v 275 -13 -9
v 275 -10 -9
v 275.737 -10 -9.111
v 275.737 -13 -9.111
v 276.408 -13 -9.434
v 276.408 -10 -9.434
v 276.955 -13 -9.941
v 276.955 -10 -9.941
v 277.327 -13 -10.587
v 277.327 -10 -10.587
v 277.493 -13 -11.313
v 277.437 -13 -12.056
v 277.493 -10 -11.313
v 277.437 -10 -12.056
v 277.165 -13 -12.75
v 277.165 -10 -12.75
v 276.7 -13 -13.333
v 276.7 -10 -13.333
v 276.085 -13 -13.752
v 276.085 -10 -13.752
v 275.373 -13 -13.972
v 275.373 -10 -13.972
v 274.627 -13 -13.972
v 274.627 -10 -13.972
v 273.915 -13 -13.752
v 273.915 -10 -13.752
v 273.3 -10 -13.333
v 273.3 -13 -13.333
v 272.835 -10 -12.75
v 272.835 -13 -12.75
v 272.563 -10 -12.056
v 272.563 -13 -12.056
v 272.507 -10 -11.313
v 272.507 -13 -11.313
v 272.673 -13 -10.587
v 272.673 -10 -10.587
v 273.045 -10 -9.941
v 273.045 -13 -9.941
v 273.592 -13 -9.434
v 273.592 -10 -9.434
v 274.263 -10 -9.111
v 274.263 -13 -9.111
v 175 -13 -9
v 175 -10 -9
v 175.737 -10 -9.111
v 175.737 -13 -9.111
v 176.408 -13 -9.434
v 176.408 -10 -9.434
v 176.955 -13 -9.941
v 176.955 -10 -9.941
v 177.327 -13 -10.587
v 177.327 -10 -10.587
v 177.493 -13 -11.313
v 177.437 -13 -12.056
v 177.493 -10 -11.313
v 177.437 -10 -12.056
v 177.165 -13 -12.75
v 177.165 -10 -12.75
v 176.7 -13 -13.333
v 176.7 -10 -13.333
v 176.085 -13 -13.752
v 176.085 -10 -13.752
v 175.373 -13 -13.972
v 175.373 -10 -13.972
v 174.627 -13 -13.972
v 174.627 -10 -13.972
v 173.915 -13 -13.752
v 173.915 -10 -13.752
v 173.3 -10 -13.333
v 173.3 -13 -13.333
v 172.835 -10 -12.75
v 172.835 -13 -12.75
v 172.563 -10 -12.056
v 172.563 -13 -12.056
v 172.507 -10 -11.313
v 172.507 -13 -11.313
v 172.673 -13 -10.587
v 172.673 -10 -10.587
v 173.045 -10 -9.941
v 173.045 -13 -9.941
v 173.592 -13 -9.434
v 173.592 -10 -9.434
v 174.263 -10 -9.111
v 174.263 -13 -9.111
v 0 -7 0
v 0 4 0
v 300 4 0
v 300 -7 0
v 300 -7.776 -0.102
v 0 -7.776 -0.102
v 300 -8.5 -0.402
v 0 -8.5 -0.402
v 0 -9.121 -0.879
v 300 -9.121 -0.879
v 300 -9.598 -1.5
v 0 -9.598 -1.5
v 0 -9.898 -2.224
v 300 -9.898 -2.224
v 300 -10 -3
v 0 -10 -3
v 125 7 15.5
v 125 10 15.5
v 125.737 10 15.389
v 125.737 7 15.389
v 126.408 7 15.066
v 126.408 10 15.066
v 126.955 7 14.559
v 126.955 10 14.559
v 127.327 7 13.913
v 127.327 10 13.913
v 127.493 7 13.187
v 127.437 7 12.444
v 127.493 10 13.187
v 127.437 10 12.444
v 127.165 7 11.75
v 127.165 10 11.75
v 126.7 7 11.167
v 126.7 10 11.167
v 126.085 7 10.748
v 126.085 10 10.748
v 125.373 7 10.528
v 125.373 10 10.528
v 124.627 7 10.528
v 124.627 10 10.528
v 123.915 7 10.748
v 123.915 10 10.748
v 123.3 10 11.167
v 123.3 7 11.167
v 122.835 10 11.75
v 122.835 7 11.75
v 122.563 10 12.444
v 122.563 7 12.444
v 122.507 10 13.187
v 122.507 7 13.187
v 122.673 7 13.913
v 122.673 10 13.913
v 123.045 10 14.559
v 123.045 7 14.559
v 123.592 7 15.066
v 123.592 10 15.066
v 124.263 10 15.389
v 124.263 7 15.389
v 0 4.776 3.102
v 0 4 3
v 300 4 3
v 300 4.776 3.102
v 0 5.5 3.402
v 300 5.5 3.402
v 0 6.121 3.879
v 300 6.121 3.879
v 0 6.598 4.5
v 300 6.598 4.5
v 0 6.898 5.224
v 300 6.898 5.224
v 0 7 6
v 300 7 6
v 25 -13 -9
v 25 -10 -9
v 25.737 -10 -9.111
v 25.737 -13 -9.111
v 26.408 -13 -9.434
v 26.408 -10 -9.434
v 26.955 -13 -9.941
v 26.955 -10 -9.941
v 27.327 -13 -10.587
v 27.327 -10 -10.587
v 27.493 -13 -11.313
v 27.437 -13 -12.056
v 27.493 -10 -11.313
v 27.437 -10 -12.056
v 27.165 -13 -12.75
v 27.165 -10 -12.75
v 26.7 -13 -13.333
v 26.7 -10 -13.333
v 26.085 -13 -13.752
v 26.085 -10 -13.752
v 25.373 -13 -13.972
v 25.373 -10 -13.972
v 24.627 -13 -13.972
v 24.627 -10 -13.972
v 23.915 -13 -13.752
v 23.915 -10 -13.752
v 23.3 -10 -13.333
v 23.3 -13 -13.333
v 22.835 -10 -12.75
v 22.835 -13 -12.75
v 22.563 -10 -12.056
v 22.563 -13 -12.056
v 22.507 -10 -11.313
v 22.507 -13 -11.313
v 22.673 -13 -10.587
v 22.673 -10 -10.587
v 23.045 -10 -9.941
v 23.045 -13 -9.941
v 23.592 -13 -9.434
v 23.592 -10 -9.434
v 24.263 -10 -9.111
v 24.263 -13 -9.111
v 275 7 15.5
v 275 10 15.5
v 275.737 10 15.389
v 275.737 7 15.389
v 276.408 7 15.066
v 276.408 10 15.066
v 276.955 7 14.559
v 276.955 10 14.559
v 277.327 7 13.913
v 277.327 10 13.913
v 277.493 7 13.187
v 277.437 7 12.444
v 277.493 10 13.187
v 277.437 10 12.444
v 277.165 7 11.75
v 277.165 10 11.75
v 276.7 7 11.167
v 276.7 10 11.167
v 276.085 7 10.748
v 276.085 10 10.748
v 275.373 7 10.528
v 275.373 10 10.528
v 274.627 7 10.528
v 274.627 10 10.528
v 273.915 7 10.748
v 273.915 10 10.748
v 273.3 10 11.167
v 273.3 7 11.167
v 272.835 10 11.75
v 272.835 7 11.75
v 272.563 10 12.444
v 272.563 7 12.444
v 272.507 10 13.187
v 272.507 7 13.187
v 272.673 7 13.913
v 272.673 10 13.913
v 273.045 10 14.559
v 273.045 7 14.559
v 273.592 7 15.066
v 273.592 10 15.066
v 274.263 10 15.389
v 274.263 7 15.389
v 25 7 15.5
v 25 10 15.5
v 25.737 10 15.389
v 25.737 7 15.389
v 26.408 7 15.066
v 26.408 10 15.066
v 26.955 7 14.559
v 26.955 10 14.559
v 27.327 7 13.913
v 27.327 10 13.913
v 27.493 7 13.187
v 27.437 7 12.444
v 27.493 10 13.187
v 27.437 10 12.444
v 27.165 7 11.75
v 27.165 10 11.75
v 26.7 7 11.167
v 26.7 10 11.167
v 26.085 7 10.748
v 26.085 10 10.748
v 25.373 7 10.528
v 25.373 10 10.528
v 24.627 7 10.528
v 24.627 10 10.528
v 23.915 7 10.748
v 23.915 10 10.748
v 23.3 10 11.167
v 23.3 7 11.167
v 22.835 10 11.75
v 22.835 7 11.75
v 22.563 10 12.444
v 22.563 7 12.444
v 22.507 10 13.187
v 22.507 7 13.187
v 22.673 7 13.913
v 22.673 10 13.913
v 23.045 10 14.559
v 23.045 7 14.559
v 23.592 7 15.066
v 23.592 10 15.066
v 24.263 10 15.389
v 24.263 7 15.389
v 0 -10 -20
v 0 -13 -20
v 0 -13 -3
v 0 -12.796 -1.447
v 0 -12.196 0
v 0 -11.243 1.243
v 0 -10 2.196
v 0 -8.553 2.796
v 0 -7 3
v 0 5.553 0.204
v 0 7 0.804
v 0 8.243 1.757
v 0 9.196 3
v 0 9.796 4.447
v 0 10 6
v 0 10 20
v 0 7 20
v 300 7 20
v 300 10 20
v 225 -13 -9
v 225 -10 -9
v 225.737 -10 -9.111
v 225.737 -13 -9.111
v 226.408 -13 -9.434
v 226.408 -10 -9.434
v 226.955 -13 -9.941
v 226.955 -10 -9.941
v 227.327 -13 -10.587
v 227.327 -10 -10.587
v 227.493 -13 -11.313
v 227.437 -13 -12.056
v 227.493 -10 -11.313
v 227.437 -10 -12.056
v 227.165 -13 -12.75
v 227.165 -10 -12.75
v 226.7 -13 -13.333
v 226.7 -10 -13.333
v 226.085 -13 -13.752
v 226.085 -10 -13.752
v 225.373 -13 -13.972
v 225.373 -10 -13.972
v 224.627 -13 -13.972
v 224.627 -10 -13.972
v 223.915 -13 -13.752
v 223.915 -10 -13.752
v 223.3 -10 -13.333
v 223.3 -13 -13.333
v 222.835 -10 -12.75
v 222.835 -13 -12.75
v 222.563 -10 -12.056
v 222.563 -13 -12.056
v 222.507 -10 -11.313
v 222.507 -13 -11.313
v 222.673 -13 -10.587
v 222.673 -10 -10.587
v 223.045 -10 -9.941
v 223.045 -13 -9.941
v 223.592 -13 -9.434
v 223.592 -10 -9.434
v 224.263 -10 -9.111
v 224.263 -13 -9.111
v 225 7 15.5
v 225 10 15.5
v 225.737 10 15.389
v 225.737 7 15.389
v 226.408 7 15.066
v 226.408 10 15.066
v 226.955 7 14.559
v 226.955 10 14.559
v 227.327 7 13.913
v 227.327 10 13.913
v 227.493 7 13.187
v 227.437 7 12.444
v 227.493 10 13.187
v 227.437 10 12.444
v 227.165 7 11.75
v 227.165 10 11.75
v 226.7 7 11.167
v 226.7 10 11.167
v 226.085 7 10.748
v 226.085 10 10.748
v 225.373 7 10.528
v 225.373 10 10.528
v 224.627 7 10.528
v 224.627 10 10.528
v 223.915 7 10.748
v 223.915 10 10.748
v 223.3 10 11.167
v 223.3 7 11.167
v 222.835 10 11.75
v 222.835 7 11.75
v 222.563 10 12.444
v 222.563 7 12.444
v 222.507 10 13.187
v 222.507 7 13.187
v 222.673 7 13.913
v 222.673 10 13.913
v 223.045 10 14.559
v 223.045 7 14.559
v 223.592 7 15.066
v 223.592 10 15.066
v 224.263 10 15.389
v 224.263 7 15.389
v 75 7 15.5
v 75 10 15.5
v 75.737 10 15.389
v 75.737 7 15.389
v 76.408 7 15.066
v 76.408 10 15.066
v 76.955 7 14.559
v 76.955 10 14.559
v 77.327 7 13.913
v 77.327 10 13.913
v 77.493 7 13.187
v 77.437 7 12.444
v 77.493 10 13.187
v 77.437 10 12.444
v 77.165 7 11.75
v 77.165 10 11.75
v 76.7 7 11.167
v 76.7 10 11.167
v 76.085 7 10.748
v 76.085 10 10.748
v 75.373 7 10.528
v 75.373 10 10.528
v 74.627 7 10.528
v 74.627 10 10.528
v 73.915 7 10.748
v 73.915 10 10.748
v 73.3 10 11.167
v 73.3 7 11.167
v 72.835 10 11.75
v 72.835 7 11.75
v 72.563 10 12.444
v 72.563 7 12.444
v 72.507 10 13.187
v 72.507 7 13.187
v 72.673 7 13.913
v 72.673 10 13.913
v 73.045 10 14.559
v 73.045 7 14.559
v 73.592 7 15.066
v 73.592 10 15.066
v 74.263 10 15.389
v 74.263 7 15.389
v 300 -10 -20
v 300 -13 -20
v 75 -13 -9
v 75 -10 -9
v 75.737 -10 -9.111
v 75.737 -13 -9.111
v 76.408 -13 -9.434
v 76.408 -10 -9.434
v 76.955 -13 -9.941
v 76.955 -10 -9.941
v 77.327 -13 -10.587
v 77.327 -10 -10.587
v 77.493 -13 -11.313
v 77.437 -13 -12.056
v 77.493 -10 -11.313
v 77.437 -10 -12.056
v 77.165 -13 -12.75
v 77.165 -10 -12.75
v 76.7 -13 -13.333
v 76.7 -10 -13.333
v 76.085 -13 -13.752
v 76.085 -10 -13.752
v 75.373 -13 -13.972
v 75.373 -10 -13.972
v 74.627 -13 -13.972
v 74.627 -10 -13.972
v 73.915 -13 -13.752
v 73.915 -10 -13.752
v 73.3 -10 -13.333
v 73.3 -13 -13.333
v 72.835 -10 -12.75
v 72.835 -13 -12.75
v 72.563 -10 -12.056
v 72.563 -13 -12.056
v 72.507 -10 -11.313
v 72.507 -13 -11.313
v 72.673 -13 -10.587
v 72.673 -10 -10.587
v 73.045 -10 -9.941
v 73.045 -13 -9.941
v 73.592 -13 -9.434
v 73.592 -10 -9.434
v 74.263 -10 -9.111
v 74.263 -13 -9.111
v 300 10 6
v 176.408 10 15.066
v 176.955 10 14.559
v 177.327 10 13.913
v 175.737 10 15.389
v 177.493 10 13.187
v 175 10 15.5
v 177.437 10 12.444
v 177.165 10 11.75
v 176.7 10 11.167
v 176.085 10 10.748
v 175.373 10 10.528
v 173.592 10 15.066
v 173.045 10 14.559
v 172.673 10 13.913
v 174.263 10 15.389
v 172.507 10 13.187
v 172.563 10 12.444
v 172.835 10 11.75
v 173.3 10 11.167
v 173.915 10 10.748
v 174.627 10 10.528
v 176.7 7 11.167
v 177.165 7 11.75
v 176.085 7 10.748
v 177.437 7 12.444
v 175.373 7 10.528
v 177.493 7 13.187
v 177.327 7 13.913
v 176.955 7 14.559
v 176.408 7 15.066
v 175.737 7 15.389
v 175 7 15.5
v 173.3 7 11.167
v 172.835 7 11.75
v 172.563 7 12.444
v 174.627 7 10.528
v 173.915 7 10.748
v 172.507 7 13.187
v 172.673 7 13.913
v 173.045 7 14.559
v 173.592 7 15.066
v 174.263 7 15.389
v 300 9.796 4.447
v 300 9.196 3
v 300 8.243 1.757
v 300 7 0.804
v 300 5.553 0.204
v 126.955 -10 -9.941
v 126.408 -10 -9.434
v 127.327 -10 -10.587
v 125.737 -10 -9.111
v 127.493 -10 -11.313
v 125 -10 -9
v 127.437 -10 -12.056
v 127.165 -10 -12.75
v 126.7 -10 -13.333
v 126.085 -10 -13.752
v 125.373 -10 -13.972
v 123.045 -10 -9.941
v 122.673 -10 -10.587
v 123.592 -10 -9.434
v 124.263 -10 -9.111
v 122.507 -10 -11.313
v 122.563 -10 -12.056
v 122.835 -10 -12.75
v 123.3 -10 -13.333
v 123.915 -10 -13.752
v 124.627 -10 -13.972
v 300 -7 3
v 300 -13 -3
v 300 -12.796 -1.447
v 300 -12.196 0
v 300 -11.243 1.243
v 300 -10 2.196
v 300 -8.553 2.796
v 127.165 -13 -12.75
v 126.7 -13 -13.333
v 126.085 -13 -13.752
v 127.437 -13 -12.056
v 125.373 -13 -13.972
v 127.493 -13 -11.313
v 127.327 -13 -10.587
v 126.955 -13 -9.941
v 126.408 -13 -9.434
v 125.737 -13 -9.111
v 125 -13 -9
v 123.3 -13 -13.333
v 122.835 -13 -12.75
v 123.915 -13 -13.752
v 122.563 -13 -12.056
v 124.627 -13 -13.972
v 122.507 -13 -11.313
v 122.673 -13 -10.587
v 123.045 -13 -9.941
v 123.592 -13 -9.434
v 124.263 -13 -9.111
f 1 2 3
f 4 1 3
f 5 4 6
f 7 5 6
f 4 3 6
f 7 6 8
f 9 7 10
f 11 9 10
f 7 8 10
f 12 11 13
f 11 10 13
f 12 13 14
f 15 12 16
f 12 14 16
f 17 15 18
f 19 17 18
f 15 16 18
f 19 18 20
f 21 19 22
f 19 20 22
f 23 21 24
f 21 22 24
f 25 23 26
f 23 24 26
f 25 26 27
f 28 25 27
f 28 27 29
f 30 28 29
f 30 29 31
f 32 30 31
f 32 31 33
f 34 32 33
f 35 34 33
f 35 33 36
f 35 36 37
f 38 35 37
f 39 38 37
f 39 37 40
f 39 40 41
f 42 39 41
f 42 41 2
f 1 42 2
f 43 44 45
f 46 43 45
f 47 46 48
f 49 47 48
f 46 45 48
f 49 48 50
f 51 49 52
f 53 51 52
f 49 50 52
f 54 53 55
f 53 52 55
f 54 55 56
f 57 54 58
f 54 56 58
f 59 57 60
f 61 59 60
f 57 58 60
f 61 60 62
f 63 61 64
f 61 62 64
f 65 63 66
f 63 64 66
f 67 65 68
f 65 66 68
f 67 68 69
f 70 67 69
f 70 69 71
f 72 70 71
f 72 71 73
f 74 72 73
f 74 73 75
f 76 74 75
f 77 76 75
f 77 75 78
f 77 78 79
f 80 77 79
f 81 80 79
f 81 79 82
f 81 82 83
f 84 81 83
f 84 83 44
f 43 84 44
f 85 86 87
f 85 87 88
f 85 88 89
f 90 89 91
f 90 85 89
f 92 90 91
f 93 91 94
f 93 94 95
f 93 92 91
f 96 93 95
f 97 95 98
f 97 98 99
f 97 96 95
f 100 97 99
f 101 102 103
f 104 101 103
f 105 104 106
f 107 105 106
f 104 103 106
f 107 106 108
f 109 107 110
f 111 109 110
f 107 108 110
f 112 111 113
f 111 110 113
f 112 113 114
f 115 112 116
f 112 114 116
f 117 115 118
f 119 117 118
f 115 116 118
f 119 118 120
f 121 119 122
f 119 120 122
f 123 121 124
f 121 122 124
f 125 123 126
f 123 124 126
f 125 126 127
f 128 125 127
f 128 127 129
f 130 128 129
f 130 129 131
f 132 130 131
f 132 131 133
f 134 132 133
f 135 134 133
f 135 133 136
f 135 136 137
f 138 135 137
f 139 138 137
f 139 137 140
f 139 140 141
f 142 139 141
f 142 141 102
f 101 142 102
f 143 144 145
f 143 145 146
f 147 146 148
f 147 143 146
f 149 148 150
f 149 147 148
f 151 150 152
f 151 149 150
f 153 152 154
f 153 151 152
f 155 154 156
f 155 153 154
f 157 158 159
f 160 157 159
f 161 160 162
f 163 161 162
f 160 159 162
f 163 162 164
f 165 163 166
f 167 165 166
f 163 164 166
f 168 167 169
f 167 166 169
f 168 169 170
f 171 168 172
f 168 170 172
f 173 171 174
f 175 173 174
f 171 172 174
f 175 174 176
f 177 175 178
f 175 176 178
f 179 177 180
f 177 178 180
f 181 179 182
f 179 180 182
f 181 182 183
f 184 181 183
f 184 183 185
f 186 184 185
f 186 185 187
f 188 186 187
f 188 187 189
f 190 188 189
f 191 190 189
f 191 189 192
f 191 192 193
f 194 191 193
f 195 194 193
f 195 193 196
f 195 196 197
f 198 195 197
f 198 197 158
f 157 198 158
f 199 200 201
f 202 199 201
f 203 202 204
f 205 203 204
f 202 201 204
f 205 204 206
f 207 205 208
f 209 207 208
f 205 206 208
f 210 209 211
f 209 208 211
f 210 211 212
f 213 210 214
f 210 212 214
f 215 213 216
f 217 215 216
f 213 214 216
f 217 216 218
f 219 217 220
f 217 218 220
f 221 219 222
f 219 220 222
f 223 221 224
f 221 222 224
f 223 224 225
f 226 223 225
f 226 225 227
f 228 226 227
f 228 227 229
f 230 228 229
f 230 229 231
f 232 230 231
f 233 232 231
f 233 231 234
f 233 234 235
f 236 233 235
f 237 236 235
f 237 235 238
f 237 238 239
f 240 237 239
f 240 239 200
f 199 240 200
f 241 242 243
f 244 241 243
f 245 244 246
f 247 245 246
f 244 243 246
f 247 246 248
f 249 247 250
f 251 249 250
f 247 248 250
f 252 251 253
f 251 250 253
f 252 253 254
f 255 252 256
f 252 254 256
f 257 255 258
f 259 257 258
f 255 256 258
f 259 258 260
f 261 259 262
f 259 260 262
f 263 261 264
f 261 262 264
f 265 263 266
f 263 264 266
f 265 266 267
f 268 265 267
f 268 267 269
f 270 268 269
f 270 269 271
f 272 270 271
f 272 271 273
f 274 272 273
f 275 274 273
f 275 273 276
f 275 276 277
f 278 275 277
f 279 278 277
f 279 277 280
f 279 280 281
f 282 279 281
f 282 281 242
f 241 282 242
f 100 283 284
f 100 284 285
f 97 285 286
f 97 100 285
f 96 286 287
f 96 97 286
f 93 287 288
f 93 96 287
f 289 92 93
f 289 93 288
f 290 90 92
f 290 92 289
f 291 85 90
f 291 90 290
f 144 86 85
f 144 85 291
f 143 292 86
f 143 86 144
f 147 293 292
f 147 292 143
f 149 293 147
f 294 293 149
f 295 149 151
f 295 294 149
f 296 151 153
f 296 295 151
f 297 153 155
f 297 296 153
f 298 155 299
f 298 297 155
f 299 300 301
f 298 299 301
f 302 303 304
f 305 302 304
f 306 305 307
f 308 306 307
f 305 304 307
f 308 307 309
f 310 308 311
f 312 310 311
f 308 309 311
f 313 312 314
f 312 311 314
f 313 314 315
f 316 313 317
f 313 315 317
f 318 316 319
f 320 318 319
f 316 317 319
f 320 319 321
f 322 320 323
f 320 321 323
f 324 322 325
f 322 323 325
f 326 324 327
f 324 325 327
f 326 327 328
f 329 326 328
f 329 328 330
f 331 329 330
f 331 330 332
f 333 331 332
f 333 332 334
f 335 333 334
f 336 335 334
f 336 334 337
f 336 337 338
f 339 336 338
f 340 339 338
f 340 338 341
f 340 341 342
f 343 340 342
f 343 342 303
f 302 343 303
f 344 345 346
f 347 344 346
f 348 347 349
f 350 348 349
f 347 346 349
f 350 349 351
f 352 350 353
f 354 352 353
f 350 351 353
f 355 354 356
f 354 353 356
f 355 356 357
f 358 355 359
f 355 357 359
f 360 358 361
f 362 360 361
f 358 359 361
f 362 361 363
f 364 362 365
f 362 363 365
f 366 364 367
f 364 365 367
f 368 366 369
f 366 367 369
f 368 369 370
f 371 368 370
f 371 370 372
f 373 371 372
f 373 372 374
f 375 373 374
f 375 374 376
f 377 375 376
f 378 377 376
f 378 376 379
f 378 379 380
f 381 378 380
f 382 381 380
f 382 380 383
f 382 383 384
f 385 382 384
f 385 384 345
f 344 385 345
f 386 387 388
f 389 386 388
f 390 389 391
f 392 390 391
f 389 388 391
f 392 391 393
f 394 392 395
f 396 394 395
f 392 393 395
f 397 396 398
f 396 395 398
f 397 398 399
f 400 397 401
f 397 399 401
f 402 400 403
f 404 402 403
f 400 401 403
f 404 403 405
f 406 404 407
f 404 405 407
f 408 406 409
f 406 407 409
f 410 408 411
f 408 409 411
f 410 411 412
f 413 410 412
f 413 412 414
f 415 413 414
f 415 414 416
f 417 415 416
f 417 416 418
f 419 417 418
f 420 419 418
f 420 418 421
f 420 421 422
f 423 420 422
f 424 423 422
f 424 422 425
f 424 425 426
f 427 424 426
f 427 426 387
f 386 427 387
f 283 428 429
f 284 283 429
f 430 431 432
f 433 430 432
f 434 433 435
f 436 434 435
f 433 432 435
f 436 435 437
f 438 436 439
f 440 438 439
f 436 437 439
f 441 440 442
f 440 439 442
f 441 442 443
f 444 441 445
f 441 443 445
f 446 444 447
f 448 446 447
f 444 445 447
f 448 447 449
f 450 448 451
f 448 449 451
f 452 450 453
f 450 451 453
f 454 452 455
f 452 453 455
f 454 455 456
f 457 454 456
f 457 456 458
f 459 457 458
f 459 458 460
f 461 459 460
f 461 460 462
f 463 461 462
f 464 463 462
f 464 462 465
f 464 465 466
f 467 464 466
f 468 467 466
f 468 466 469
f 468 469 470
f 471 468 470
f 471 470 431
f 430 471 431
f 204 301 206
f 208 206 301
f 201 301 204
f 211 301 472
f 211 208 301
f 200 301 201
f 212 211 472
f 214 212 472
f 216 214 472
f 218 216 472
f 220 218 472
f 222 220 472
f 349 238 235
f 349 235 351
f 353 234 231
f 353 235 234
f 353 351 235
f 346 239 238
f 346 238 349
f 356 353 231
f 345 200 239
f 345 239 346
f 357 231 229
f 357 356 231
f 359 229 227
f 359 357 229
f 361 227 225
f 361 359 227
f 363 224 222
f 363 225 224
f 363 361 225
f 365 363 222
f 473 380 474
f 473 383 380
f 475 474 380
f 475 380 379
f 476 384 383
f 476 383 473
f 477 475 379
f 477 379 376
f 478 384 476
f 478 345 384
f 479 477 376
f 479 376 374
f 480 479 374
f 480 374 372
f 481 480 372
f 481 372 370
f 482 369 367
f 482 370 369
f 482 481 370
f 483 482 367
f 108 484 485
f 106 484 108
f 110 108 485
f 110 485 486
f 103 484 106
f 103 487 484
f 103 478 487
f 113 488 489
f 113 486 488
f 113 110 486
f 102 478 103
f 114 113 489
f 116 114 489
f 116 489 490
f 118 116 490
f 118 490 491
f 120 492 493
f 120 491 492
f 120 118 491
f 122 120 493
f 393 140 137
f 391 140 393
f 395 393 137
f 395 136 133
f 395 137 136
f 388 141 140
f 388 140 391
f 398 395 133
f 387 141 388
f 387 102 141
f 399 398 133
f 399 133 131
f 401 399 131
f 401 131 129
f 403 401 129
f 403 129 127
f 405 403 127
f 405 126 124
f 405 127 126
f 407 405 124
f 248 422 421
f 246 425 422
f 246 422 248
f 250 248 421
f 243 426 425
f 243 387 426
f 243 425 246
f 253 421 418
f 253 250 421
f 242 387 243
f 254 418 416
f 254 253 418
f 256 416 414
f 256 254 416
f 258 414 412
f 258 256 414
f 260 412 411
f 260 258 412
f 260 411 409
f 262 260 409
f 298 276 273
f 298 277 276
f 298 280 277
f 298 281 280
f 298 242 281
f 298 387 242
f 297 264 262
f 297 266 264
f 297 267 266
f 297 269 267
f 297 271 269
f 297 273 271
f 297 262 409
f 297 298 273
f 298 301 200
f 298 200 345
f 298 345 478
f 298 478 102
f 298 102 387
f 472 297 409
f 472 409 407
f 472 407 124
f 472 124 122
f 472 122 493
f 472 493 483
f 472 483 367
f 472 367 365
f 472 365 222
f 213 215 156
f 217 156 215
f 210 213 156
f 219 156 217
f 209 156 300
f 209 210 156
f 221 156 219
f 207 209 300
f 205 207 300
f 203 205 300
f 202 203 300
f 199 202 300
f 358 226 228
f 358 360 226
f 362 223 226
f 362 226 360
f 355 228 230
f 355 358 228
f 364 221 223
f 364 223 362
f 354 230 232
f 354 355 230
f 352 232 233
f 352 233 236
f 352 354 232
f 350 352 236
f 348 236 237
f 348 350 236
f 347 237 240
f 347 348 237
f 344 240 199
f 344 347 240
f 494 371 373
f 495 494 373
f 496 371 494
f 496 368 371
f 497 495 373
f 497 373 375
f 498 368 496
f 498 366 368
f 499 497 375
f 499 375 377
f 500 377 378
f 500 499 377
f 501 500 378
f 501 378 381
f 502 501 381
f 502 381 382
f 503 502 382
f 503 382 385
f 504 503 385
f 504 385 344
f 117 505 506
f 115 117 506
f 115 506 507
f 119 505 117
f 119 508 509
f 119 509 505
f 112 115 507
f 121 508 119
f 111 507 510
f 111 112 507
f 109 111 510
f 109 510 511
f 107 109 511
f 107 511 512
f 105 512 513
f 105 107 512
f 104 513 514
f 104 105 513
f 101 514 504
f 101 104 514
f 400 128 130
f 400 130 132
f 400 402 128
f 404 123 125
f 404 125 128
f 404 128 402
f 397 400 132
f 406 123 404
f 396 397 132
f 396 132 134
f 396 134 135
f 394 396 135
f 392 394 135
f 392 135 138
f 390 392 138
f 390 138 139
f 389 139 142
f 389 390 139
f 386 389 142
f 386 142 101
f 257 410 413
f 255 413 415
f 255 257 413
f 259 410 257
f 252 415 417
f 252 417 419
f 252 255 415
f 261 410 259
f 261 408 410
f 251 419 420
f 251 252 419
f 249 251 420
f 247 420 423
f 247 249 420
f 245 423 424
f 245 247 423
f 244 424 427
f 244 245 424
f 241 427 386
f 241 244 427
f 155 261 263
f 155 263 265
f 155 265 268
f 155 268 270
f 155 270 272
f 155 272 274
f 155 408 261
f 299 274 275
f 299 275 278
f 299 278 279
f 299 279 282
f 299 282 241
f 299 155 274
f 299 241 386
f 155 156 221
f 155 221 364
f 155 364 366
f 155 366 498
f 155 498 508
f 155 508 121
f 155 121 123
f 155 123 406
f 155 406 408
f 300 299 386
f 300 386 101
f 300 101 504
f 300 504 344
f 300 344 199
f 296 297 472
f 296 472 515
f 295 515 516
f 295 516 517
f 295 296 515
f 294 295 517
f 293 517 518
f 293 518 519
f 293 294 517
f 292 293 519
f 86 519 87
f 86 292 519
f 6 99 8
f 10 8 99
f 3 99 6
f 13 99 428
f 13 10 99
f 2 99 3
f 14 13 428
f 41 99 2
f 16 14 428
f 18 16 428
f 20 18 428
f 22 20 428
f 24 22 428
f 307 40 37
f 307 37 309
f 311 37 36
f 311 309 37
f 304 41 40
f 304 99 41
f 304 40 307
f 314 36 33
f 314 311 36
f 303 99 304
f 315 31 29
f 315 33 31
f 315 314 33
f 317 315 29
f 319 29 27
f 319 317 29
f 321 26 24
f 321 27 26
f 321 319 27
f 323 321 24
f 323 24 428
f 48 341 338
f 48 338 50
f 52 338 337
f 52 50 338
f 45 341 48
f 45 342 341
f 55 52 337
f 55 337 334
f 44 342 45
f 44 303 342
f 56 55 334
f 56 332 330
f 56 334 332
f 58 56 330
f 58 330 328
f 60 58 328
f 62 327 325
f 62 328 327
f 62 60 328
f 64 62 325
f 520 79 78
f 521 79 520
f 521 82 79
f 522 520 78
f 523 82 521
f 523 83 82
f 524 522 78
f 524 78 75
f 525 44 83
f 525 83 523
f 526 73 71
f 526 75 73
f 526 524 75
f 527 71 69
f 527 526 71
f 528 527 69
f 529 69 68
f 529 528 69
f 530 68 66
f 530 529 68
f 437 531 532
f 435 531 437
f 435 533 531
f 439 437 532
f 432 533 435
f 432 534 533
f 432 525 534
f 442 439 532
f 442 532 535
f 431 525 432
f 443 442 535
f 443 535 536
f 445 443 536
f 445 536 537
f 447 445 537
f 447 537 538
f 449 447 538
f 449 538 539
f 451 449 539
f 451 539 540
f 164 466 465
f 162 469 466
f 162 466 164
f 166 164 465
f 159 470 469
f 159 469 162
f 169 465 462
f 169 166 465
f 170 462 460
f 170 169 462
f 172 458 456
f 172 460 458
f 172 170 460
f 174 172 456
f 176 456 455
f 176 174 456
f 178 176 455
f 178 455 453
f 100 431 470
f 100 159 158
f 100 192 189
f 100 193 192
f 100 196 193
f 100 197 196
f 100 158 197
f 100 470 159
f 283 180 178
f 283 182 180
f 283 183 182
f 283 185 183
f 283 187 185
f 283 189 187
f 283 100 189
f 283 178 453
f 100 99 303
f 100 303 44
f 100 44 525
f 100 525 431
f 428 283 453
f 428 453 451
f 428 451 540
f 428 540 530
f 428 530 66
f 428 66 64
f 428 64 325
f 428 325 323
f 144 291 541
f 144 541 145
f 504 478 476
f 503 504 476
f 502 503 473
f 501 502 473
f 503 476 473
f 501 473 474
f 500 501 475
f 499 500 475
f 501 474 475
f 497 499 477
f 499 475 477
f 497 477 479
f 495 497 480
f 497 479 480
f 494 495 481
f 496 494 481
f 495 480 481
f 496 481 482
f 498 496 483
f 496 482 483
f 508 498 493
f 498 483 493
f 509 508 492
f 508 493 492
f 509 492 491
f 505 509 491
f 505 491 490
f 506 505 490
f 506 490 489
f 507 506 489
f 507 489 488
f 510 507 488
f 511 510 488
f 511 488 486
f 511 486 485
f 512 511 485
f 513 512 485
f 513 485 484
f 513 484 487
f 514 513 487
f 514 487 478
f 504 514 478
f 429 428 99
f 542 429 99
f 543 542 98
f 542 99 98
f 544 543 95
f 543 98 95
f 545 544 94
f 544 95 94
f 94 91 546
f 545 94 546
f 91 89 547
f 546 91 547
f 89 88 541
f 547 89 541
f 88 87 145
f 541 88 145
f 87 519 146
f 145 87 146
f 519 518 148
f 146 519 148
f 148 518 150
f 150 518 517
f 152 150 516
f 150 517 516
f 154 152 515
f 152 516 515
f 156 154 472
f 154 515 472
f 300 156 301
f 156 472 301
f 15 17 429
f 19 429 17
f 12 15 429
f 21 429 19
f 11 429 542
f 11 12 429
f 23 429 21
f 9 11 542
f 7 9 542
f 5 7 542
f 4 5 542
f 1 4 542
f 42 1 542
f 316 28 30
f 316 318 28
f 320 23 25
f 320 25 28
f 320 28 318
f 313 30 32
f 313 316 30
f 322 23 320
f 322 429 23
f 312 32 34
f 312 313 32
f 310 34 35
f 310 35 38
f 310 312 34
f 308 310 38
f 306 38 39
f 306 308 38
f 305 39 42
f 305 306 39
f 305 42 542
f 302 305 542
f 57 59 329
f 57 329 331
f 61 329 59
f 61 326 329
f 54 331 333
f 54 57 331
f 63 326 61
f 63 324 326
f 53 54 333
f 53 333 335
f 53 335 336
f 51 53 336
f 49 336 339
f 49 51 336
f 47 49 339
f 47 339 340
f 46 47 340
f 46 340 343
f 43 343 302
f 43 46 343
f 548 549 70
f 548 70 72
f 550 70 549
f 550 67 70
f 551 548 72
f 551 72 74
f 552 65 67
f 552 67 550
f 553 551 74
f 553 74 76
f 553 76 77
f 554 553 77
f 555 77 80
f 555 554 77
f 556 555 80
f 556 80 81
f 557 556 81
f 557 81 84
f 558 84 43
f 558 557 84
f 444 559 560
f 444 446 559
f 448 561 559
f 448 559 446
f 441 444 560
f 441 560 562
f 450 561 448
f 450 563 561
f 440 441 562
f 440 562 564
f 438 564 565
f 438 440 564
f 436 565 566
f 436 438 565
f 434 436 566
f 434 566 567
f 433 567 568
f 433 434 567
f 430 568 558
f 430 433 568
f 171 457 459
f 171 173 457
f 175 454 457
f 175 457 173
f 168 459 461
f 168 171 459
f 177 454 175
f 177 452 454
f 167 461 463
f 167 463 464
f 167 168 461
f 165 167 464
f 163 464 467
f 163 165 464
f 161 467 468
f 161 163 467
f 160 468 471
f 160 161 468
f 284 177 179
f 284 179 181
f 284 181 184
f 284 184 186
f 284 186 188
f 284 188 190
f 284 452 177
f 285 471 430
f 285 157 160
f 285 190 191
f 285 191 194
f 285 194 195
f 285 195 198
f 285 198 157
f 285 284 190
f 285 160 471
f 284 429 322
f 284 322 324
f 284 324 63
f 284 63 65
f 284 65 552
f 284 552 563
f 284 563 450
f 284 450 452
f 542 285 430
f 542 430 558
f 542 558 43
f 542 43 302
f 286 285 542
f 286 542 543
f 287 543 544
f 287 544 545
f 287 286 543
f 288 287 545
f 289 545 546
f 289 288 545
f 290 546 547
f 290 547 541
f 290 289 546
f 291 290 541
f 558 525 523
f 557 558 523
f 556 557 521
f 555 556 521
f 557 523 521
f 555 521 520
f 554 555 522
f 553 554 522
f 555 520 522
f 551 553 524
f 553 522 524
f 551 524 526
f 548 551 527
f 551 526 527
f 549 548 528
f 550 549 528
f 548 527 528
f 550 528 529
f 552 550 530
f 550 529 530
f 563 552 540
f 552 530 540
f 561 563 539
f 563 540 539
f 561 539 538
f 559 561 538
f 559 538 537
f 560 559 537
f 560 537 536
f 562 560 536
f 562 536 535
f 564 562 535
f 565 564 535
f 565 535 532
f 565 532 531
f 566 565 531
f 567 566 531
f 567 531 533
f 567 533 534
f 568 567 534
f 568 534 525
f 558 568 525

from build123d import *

# Parameters (mm, degrees)
BASE_FLANGE1_DEPTH = 300
CUT_EXTRUDE1_REACH = 303.544
SKETCH6_R          = 2.5


# Sheet-metal steps are written as plain solids
with BuildPart() as part:
    # Sketch1 → Base-Flange1 (new body)
    with BuildSketch(Plane(origin=(0, 0, 0), x_dir=(0, 0, -1), z_dir=(1, 0, 0))):
        with BuildLine():
            Line((-20, 10), (-6, 10))
            ThreePointArc((-6, 10), (-1.757359313, 8.242640687), (0, 4))
            Line((0, 4), (0, -7))
            ThreePointArc((0, -7), (0.878679656, -9.121320344), (3, -10))
            Line((3, -10), (20, -10))
            Line((20, -10), (20, -13))
            Line((20, -13), (3, -13))
            ThreePointArc((3, -13), (-1.242640687, -11.242640687), (-3, -7))
            Line((-3, -7), (-3, 4))
            ThreePointArc((-3, 4), (-3.878679656, 6.121320344), (-6, 7))
            Line((-6, 7), (-20, 7))
            Line((-20, 7), (-20, 10))
        make_face()
    extrude(amount=BASE_FLANGE1_DEPTH)

    # Sketch6 → Cut-Extrude1 (cut, up to next)
    with BuildSketch(Plane(origin=(0, 10, 0), x_dir=(1, 0, 0), z_dir=(0, 1, 0)), mode=Mode.PRIVATE) as cut_extrude1_sk1:
        with Locations(Location((25, -13, 0), (0, 0, 270))):
            Circle(SKETCH6_R)
    cut_extrude1_tool1 = extrude(cut_extrude1_sk1.sketch, amount=-CUT_EXTRUDE1_REACH, mode=Mode.PRIVATE) & part.part
    # Sketch6 → Cut-Extrude1 (cut, up to next)
    with BuildSketch(Plane(origin=(0, 10, 0), x_dir=(1, 0, 0), z_dir=(0, 1, 0)), mode=Mode.PRIVATE) as cut_extrude1_sk2:
        with Locations(Location((75, -13, 0), (0, 0, 270))):
            Circle(SKETCH6_R)
    cut_extrude1_tool2 = extrude(cut_extrude1_sk2.sketch, amount=-CUT_EXTRUDE1_REACH, mode=Mode.PRIVATE) & part.part
    # Sketch6 → Cut-Extrude1 (cut, up to next)
    with BuildSketch(Plane(origin=(0, 10, 0), x_dir=(1, 0, 0), z_dir=(0, 1, 0)), mode=Mode.PRIVATE) as cut_extrude1_sk3:
        with Locations(Location((125, -13, 0), (0, 0, 270))):
            Circle(SKETCH6_R)
    cut_extrude1_tool3 = extrude(cut_extrude1_sk3.sketch, amount=-CUT_EXTRUDE1_REACH, mode=Mode.PRIVATE) & part.part
    # Sketch6 → Cut-Extrude1 (cut, up to next)
    with BuildSketch(Plane(origin=(0, 10, 0), x_dir=(1, 0, 0), z_dir=(0, 1, 0)), mode=Mode.PRIVATE) as cut_extrude1_sk4:
        with Locations(Location((175, -13, 0), (0, 0, 270))):
            Circle(SKETCH6_R)
    cut_extrude1_tool4 = extrude(cut_extrude1_sk4.sketch, amount=-CUT_EXTRUDE1_REACH, mode=Mode.PRIVATE) & part.part
    # Sketch6 → Cut-Extrude1 (cut, up to next)
    with BuildSketch(Plane(origin=(0, 10, 0), x_dir=(1, 0, 0), z_dir=(0, 1, 0)), mode=Mode.PRIVATE) as cut_extrude1_sk5:
        with Locations(Location((225, -13, 0), (0, 0, 270))):
            Circle(SKETCH6_R)
    cut_extrude1_tool5 = extrude(cut_extrude1_sk5.sketch, amount=-CUT_EXTRUDE1_REACH, mode=Mode.PRIVATE) & part.part
    # Sketch6 → Cut-Extrude1 (cut, up to next)
    with BuildSketch(Plane(origin=(0, 10, 0), x_dir=(1, 0, 0), z_dir=(0, 1, 0)), mode=Mode.PRIVATE) as cut_extrude1_sk6:
        with Locations(Location((275, -13, 0), (0, 0, 270))):
            Circle(SKETCH6_R)
    cut_extrude1_tool6 = extrude(cut_extrude1_sk6.sketch, amount=-CUT_EXTRUDE1_REACH, mode=Mode.PRIVATE) & part.part
    # Sketch6 → Cut-Extrude1 (cut, up to next)
    with BuildSketch(Plane(origin=(0, 10, 0), x_dir=(1, 0, 0), z_dir=(0, 1, 0)), mode=Mode.PRIVATE) as cut_extrude1_sk7:
        with Locations(Location((75, 11.5, 0), (0, 0, 270))):
            Circle(SKETCH6_R)
    cut_extrude1_tool7 = extrude(cut_extrude1_sk7.sketch, amount=-CUT_EXTRUDE1_REACH, mode=Mode.PRIVATE) & part.part
    # Sketch6 → Cut-Extrude1 (cut, up to next)
    with BuildSketch(Plane(origin=(0, 10, 0), x_dir=(1, 0, 0), z_dir=(0, 1, 0)), mode=Mode.PRIVATE) as cut_extrude1_sk8:
        with Locations(Location((125, 11.5, 0), (0, 0, 270))):
            Circle(SKETCH6_R)
    cut_extrude1_tool8 = extrude(cut_extrude1_sk8.sketch, amount=-CUT_EXTRUDE1_REACH, mode=Mode.PRIVATE) & part.part
    # Sketch6 → Cut-Extrude1 (cut, up to next)
    with BuildSketch(Plane(origin=(0, 10, 0), x_dir=(1, 0, 0), z_dir=(0, 1, 0)), mode=Mode.PRIVATE) as cut_extrude1_sk9:
        with Locations(Location((175, 11.5, 0), (0, 0, 270))):
            Circle(SKETCH6_R)
    cut_extrude1_tool9 = extrude(cut_extrude1_sk9.sketch, amount=-CUT_EXTRUDE1_REACH, mode=Mode.PRIVATE) & part.part
    # Sketch6 → Cut-Extrude1 (cut, up to next)
    with BuildSketch(Plane(origin=(0, 10, 0), x_dir=(1, 0, 0), z_dir=(0, 1, 0)), mode=Mode.PRIVATE) as cut_extrude1_sk10:
        with Locations(Location((225, 11.5, 0), (0, 0, 270))):
            Circle(SKETCH6_R)
    cut_extrude1_tool10 = extrude(cut_extrude1_sk10.sketch, amount=-CUT_EXTRUDE1_REACH, mode=Mode.PRIVATE) & part.part
    # Sketch6 → Cut-Extrude1 (cut, up to next)
    with BuildSketch(Plane(origin=(0, 10, 0), x_dir=(1, 0, 0), z_dir=(0, 1, 0)), mode=Mode.PRIVATE) as cut_extrude1_sk11:
        with Locations(Location((275, 11.5, 0), (0, 0, 270))):
            Circle(SKETCH6_R)
    cut_extrude1_tool11 = extrude(cut_extrude1_sk11.sketch, amount=-CUT_EXTRUDE1_REACH, mode=Mode.PRIVATE) & part.part
    # Sketch6 → Cut-Extrude1 (cut, up to next)
    with BuildSketch(Plane(origin=(0, 10, 0), x_dir=(1, 0, 0), z_dir=(0, 1, 0)), mode=Mode.PRIVATE) as cut_extrude1_sk12:
        with Locations(Location((25, 11.5, 0), (0, 0, 270))):
            Circle(SKETCH6_R)
    cut_extrude1_tool12 = extrude(cut_extrude1_sk12.sketch, amount=-CUT_EXTRUDE1_REACH, mode=Mode.PRIVATE) & part.part
    add(cut_extrude1_tool1.solids().sort_by_distance((25, 10, 13))[0], mode=Mode.SUBTRACT)
    add(cut_extrude1_tool2.solids().sort_by_distance((75, 10, 13))[0], mode=Mode.SUBTRACT)
    add(cut_extrude1_tool3.solids().sort_by_distance((125, 10, 13))[0], mode=Mode.SUBTRACT)
    add(cut_extrude1_tool4.solids().sort_by_distance((175, 10, 13))[0], mode=Mode.SUBTRACT)
    add(cut_extrude1_tool5.solids().sort_by_distance((225, 10, 13))[0], mode=Mode.SUBTRACT)
    add(cut_extrude1_tool6.solids().sort_by_distance((275, 10, 13))[0], mode=Mode.SUBTRACT)
    add(cut_extrude1_tool7.solids().sort_by_distance((75, 10, -11.5))[0], mode=Mode.SUBTRACT)
    add(cut_extrude1_tool8.solids().sort_by_distance((125, 10, -11.5))[0], mode=Mode.SUBTRACT)
    add(cut_extrude1_tool9.solids().sort_by_distance((175, 10, -11.5))[0], mode=Mode.SUBTRACT)
    add(cut_extrude1_tool10.solids().sort_by_distance((225, 10, -11.5))[0], mode=Mode.SUBTRACT)
    add(cut_extrude1_tool11.solids().sort_by_distance((275, 10, -11.5))[0], mode=Mode.SUBTRACT)
    add(cut_extrude1_tool12.solids().sort_by_distance((25, 10, -11.5))[0], mode=Mode.SUBTRACT)


solid = part.part
